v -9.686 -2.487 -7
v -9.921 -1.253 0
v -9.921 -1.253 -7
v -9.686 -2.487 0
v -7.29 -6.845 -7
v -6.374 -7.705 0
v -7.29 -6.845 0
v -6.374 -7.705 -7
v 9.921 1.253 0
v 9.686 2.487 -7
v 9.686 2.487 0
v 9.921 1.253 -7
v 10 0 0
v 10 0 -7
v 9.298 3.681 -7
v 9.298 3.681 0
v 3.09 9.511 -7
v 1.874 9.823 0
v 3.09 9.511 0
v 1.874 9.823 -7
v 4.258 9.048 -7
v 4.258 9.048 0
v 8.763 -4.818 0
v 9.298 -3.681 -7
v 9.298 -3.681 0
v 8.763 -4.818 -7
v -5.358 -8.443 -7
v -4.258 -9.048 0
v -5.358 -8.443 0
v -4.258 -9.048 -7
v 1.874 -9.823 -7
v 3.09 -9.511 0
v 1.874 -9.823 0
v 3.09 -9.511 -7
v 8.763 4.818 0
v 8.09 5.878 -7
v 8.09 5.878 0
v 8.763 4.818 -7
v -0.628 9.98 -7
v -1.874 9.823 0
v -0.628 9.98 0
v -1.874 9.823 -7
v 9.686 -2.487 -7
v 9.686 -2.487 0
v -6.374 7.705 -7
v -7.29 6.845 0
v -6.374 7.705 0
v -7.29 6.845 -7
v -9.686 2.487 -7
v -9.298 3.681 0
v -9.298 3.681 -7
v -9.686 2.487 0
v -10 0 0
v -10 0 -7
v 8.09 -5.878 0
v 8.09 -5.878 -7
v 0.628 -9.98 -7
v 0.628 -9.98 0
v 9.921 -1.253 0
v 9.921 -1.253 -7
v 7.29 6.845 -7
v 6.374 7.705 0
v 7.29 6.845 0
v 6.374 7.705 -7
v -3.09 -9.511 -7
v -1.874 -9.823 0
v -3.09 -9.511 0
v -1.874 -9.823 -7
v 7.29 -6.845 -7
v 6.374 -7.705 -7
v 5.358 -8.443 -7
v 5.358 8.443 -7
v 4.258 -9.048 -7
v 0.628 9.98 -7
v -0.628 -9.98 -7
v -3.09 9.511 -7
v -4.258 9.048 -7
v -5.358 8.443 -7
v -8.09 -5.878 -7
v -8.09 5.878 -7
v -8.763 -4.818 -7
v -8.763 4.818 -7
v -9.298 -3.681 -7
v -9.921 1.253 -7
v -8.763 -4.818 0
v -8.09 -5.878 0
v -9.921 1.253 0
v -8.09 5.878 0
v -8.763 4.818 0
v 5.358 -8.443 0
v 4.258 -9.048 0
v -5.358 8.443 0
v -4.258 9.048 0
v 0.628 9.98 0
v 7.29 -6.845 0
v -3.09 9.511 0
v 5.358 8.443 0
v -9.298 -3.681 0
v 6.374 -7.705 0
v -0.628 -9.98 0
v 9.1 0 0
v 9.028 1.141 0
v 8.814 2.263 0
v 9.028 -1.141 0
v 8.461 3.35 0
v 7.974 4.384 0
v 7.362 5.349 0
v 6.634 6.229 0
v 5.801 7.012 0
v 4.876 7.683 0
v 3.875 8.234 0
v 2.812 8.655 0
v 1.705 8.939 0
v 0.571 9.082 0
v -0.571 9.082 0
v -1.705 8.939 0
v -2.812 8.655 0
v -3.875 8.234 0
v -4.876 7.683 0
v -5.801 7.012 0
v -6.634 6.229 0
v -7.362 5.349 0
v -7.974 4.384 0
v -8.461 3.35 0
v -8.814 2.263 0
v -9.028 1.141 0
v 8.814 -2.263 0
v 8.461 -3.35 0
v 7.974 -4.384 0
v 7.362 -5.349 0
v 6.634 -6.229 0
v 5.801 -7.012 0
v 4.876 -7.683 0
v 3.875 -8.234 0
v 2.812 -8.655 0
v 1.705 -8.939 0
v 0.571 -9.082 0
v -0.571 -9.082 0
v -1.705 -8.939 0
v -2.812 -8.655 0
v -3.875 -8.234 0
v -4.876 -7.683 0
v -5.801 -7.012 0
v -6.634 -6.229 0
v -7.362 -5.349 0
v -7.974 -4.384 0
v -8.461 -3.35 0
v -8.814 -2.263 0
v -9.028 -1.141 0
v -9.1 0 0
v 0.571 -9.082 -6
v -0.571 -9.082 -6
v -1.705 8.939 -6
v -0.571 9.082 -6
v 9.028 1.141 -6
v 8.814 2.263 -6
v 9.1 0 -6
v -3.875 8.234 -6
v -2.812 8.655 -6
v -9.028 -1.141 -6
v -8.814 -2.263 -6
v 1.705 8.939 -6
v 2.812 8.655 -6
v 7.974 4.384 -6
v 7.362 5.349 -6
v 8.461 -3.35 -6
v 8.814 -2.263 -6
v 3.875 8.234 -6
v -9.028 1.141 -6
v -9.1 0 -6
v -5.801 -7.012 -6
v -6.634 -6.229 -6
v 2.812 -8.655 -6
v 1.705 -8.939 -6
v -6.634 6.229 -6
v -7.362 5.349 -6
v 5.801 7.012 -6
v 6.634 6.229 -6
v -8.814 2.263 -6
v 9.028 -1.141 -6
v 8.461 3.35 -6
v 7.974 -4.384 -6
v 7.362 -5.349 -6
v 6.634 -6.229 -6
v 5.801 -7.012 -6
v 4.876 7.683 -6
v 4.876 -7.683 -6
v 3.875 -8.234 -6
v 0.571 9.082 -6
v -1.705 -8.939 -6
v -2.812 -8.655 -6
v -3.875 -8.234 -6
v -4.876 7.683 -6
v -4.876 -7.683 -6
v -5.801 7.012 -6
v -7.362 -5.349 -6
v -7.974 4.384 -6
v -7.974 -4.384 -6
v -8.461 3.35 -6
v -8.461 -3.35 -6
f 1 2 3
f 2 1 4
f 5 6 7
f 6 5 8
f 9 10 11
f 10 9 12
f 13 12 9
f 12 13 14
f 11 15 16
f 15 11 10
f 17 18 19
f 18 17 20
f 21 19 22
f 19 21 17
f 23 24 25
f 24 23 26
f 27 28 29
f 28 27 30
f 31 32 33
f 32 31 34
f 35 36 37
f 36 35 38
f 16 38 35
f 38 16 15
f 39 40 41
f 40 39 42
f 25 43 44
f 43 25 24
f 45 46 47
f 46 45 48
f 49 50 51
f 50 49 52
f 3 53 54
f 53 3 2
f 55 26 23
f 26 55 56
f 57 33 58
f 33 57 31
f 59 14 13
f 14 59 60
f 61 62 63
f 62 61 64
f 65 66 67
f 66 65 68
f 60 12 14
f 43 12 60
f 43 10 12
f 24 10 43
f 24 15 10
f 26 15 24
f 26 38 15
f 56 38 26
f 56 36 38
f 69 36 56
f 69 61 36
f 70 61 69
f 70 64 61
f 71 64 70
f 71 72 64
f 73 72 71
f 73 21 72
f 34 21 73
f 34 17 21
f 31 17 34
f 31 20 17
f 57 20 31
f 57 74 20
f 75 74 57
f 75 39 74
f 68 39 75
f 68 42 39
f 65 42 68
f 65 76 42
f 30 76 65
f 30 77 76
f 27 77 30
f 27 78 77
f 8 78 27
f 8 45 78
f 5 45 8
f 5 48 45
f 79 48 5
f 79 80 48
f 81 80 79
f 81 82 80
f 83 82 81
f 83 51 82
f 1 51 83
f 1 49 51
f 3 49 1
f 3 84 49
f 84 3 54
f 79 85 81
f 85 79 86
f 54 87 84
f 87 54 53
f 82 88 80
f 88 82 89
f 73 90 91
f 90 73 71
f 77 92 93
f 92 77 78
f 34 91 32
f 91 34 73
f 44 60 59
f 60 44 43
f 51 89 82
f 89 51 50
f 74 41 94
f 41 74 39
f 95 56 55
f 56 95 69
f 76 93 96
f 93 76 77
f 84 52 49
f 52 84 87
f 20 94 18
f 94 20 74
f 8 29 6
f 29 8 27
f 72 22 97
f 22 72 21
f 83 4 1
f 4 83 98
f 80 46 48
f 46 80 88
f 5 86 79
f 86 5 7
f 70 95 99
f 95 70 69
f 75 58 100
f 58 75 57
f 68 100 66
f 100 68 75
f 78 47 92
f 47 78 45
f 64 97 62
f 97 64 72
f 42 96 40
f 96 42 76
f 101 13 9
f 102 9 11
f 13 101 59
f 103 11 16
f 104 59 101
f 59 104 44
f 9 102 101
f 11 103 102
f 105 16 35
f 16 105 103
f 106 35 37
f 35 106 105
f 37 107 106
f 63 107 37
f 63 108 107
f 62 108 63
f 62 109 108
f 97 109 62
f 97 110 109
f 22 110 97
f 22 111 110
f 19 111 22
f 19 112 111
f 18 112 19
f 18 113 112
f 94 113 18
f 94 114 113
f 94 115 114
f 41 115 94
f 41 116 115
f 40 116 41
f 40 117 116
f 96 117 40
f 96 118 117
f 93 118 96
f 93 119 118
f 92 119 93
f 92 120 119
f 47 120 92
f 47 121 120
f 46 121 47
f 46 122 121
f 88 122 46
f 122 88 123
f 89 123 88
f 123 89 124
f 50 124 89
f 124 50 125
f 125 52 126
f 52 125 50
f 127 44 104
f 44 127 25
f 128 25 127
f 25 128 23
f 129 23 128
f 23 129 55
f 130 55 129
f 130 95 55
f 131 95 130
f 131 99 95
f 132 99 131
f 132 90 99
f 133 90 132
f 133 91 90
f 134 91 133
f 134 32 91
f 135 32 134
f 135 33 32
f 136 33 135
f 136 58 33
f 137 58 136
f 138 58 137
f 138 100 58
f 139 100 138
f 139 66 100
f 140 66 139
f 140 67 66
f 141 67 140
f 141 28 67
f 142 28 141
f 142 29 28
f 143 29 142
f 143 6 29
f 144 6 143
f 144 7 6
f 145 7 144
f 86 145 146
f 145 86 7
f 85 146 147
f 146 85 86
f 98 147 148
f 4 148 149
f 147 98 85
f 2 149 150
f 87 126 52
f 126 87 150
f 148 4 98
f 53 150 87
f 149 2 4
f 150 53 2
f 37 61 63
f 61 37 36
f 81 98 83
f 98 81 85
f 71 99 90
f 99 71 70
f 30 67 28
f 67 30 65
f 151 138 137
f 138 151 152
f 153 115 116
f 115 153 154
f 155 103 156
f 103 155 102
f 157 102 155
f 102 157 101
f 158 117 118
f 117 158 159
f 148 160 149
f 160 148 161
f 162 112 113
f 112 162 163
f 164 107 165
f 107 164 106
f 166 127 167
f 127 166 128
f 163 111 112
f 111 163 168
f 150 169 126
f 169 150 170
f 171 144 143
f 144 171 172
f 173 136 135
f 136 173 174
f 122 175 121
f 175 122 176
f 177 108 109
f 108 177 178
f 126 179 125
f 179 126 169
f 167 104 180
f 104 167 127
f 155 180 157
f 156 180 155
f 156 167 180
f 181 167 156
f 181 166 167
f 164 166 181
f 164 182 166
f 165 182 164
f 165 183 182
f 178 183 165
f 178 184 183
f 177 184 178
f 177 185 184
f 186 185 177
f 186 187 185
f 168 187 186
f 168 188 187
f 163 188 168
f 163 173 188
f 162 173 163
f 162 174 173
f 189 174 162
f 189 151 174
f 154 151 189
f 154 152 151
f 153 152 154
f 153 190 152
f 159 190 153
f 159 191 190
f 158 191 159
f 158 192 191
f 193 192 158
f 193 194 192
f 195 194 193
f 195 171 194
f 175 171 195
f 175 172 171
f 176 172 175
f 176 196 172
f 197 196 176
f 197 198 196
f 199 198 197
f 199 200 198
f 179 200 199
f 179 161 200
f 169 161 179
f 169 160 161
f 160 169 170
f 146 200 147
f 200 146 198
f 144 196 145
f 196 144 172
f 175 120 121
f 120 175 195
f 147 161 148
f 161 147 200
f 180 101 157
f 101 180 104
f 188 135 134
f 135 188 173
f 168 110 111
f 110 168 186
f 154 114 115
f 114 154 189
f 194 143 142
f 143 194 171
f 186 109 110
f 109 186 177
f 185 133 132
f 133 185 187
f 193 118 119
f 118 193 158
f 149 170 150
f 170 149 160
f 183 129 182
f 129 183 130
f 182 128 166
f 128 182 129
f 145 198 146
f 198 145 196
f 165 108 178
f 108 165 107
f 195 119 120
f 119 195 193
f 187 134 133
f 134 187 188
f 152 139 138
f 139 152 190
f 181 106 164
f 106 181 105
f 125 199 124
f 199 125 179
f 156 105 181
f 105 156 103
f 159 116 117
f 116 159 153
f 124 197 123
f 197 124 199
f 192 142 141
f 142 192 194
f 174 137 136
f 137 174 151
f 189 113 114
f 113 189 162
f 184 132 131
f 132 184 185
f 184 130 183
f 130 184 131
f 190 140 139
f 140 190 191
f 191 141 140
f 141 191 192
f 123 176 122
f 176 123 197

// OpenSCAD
$fn = 50;


difference() {
	union() {
		translate(v = [0, 0, -7.0000000000]) {
			cylinder(h = 7, r = 10.0000000000);
		}
	}
	union() {
		#translate(v = [0, 0, -6.0000000000]) {
			cylinder(h = 6, r = 9.1000000000);
		}
	}
}
